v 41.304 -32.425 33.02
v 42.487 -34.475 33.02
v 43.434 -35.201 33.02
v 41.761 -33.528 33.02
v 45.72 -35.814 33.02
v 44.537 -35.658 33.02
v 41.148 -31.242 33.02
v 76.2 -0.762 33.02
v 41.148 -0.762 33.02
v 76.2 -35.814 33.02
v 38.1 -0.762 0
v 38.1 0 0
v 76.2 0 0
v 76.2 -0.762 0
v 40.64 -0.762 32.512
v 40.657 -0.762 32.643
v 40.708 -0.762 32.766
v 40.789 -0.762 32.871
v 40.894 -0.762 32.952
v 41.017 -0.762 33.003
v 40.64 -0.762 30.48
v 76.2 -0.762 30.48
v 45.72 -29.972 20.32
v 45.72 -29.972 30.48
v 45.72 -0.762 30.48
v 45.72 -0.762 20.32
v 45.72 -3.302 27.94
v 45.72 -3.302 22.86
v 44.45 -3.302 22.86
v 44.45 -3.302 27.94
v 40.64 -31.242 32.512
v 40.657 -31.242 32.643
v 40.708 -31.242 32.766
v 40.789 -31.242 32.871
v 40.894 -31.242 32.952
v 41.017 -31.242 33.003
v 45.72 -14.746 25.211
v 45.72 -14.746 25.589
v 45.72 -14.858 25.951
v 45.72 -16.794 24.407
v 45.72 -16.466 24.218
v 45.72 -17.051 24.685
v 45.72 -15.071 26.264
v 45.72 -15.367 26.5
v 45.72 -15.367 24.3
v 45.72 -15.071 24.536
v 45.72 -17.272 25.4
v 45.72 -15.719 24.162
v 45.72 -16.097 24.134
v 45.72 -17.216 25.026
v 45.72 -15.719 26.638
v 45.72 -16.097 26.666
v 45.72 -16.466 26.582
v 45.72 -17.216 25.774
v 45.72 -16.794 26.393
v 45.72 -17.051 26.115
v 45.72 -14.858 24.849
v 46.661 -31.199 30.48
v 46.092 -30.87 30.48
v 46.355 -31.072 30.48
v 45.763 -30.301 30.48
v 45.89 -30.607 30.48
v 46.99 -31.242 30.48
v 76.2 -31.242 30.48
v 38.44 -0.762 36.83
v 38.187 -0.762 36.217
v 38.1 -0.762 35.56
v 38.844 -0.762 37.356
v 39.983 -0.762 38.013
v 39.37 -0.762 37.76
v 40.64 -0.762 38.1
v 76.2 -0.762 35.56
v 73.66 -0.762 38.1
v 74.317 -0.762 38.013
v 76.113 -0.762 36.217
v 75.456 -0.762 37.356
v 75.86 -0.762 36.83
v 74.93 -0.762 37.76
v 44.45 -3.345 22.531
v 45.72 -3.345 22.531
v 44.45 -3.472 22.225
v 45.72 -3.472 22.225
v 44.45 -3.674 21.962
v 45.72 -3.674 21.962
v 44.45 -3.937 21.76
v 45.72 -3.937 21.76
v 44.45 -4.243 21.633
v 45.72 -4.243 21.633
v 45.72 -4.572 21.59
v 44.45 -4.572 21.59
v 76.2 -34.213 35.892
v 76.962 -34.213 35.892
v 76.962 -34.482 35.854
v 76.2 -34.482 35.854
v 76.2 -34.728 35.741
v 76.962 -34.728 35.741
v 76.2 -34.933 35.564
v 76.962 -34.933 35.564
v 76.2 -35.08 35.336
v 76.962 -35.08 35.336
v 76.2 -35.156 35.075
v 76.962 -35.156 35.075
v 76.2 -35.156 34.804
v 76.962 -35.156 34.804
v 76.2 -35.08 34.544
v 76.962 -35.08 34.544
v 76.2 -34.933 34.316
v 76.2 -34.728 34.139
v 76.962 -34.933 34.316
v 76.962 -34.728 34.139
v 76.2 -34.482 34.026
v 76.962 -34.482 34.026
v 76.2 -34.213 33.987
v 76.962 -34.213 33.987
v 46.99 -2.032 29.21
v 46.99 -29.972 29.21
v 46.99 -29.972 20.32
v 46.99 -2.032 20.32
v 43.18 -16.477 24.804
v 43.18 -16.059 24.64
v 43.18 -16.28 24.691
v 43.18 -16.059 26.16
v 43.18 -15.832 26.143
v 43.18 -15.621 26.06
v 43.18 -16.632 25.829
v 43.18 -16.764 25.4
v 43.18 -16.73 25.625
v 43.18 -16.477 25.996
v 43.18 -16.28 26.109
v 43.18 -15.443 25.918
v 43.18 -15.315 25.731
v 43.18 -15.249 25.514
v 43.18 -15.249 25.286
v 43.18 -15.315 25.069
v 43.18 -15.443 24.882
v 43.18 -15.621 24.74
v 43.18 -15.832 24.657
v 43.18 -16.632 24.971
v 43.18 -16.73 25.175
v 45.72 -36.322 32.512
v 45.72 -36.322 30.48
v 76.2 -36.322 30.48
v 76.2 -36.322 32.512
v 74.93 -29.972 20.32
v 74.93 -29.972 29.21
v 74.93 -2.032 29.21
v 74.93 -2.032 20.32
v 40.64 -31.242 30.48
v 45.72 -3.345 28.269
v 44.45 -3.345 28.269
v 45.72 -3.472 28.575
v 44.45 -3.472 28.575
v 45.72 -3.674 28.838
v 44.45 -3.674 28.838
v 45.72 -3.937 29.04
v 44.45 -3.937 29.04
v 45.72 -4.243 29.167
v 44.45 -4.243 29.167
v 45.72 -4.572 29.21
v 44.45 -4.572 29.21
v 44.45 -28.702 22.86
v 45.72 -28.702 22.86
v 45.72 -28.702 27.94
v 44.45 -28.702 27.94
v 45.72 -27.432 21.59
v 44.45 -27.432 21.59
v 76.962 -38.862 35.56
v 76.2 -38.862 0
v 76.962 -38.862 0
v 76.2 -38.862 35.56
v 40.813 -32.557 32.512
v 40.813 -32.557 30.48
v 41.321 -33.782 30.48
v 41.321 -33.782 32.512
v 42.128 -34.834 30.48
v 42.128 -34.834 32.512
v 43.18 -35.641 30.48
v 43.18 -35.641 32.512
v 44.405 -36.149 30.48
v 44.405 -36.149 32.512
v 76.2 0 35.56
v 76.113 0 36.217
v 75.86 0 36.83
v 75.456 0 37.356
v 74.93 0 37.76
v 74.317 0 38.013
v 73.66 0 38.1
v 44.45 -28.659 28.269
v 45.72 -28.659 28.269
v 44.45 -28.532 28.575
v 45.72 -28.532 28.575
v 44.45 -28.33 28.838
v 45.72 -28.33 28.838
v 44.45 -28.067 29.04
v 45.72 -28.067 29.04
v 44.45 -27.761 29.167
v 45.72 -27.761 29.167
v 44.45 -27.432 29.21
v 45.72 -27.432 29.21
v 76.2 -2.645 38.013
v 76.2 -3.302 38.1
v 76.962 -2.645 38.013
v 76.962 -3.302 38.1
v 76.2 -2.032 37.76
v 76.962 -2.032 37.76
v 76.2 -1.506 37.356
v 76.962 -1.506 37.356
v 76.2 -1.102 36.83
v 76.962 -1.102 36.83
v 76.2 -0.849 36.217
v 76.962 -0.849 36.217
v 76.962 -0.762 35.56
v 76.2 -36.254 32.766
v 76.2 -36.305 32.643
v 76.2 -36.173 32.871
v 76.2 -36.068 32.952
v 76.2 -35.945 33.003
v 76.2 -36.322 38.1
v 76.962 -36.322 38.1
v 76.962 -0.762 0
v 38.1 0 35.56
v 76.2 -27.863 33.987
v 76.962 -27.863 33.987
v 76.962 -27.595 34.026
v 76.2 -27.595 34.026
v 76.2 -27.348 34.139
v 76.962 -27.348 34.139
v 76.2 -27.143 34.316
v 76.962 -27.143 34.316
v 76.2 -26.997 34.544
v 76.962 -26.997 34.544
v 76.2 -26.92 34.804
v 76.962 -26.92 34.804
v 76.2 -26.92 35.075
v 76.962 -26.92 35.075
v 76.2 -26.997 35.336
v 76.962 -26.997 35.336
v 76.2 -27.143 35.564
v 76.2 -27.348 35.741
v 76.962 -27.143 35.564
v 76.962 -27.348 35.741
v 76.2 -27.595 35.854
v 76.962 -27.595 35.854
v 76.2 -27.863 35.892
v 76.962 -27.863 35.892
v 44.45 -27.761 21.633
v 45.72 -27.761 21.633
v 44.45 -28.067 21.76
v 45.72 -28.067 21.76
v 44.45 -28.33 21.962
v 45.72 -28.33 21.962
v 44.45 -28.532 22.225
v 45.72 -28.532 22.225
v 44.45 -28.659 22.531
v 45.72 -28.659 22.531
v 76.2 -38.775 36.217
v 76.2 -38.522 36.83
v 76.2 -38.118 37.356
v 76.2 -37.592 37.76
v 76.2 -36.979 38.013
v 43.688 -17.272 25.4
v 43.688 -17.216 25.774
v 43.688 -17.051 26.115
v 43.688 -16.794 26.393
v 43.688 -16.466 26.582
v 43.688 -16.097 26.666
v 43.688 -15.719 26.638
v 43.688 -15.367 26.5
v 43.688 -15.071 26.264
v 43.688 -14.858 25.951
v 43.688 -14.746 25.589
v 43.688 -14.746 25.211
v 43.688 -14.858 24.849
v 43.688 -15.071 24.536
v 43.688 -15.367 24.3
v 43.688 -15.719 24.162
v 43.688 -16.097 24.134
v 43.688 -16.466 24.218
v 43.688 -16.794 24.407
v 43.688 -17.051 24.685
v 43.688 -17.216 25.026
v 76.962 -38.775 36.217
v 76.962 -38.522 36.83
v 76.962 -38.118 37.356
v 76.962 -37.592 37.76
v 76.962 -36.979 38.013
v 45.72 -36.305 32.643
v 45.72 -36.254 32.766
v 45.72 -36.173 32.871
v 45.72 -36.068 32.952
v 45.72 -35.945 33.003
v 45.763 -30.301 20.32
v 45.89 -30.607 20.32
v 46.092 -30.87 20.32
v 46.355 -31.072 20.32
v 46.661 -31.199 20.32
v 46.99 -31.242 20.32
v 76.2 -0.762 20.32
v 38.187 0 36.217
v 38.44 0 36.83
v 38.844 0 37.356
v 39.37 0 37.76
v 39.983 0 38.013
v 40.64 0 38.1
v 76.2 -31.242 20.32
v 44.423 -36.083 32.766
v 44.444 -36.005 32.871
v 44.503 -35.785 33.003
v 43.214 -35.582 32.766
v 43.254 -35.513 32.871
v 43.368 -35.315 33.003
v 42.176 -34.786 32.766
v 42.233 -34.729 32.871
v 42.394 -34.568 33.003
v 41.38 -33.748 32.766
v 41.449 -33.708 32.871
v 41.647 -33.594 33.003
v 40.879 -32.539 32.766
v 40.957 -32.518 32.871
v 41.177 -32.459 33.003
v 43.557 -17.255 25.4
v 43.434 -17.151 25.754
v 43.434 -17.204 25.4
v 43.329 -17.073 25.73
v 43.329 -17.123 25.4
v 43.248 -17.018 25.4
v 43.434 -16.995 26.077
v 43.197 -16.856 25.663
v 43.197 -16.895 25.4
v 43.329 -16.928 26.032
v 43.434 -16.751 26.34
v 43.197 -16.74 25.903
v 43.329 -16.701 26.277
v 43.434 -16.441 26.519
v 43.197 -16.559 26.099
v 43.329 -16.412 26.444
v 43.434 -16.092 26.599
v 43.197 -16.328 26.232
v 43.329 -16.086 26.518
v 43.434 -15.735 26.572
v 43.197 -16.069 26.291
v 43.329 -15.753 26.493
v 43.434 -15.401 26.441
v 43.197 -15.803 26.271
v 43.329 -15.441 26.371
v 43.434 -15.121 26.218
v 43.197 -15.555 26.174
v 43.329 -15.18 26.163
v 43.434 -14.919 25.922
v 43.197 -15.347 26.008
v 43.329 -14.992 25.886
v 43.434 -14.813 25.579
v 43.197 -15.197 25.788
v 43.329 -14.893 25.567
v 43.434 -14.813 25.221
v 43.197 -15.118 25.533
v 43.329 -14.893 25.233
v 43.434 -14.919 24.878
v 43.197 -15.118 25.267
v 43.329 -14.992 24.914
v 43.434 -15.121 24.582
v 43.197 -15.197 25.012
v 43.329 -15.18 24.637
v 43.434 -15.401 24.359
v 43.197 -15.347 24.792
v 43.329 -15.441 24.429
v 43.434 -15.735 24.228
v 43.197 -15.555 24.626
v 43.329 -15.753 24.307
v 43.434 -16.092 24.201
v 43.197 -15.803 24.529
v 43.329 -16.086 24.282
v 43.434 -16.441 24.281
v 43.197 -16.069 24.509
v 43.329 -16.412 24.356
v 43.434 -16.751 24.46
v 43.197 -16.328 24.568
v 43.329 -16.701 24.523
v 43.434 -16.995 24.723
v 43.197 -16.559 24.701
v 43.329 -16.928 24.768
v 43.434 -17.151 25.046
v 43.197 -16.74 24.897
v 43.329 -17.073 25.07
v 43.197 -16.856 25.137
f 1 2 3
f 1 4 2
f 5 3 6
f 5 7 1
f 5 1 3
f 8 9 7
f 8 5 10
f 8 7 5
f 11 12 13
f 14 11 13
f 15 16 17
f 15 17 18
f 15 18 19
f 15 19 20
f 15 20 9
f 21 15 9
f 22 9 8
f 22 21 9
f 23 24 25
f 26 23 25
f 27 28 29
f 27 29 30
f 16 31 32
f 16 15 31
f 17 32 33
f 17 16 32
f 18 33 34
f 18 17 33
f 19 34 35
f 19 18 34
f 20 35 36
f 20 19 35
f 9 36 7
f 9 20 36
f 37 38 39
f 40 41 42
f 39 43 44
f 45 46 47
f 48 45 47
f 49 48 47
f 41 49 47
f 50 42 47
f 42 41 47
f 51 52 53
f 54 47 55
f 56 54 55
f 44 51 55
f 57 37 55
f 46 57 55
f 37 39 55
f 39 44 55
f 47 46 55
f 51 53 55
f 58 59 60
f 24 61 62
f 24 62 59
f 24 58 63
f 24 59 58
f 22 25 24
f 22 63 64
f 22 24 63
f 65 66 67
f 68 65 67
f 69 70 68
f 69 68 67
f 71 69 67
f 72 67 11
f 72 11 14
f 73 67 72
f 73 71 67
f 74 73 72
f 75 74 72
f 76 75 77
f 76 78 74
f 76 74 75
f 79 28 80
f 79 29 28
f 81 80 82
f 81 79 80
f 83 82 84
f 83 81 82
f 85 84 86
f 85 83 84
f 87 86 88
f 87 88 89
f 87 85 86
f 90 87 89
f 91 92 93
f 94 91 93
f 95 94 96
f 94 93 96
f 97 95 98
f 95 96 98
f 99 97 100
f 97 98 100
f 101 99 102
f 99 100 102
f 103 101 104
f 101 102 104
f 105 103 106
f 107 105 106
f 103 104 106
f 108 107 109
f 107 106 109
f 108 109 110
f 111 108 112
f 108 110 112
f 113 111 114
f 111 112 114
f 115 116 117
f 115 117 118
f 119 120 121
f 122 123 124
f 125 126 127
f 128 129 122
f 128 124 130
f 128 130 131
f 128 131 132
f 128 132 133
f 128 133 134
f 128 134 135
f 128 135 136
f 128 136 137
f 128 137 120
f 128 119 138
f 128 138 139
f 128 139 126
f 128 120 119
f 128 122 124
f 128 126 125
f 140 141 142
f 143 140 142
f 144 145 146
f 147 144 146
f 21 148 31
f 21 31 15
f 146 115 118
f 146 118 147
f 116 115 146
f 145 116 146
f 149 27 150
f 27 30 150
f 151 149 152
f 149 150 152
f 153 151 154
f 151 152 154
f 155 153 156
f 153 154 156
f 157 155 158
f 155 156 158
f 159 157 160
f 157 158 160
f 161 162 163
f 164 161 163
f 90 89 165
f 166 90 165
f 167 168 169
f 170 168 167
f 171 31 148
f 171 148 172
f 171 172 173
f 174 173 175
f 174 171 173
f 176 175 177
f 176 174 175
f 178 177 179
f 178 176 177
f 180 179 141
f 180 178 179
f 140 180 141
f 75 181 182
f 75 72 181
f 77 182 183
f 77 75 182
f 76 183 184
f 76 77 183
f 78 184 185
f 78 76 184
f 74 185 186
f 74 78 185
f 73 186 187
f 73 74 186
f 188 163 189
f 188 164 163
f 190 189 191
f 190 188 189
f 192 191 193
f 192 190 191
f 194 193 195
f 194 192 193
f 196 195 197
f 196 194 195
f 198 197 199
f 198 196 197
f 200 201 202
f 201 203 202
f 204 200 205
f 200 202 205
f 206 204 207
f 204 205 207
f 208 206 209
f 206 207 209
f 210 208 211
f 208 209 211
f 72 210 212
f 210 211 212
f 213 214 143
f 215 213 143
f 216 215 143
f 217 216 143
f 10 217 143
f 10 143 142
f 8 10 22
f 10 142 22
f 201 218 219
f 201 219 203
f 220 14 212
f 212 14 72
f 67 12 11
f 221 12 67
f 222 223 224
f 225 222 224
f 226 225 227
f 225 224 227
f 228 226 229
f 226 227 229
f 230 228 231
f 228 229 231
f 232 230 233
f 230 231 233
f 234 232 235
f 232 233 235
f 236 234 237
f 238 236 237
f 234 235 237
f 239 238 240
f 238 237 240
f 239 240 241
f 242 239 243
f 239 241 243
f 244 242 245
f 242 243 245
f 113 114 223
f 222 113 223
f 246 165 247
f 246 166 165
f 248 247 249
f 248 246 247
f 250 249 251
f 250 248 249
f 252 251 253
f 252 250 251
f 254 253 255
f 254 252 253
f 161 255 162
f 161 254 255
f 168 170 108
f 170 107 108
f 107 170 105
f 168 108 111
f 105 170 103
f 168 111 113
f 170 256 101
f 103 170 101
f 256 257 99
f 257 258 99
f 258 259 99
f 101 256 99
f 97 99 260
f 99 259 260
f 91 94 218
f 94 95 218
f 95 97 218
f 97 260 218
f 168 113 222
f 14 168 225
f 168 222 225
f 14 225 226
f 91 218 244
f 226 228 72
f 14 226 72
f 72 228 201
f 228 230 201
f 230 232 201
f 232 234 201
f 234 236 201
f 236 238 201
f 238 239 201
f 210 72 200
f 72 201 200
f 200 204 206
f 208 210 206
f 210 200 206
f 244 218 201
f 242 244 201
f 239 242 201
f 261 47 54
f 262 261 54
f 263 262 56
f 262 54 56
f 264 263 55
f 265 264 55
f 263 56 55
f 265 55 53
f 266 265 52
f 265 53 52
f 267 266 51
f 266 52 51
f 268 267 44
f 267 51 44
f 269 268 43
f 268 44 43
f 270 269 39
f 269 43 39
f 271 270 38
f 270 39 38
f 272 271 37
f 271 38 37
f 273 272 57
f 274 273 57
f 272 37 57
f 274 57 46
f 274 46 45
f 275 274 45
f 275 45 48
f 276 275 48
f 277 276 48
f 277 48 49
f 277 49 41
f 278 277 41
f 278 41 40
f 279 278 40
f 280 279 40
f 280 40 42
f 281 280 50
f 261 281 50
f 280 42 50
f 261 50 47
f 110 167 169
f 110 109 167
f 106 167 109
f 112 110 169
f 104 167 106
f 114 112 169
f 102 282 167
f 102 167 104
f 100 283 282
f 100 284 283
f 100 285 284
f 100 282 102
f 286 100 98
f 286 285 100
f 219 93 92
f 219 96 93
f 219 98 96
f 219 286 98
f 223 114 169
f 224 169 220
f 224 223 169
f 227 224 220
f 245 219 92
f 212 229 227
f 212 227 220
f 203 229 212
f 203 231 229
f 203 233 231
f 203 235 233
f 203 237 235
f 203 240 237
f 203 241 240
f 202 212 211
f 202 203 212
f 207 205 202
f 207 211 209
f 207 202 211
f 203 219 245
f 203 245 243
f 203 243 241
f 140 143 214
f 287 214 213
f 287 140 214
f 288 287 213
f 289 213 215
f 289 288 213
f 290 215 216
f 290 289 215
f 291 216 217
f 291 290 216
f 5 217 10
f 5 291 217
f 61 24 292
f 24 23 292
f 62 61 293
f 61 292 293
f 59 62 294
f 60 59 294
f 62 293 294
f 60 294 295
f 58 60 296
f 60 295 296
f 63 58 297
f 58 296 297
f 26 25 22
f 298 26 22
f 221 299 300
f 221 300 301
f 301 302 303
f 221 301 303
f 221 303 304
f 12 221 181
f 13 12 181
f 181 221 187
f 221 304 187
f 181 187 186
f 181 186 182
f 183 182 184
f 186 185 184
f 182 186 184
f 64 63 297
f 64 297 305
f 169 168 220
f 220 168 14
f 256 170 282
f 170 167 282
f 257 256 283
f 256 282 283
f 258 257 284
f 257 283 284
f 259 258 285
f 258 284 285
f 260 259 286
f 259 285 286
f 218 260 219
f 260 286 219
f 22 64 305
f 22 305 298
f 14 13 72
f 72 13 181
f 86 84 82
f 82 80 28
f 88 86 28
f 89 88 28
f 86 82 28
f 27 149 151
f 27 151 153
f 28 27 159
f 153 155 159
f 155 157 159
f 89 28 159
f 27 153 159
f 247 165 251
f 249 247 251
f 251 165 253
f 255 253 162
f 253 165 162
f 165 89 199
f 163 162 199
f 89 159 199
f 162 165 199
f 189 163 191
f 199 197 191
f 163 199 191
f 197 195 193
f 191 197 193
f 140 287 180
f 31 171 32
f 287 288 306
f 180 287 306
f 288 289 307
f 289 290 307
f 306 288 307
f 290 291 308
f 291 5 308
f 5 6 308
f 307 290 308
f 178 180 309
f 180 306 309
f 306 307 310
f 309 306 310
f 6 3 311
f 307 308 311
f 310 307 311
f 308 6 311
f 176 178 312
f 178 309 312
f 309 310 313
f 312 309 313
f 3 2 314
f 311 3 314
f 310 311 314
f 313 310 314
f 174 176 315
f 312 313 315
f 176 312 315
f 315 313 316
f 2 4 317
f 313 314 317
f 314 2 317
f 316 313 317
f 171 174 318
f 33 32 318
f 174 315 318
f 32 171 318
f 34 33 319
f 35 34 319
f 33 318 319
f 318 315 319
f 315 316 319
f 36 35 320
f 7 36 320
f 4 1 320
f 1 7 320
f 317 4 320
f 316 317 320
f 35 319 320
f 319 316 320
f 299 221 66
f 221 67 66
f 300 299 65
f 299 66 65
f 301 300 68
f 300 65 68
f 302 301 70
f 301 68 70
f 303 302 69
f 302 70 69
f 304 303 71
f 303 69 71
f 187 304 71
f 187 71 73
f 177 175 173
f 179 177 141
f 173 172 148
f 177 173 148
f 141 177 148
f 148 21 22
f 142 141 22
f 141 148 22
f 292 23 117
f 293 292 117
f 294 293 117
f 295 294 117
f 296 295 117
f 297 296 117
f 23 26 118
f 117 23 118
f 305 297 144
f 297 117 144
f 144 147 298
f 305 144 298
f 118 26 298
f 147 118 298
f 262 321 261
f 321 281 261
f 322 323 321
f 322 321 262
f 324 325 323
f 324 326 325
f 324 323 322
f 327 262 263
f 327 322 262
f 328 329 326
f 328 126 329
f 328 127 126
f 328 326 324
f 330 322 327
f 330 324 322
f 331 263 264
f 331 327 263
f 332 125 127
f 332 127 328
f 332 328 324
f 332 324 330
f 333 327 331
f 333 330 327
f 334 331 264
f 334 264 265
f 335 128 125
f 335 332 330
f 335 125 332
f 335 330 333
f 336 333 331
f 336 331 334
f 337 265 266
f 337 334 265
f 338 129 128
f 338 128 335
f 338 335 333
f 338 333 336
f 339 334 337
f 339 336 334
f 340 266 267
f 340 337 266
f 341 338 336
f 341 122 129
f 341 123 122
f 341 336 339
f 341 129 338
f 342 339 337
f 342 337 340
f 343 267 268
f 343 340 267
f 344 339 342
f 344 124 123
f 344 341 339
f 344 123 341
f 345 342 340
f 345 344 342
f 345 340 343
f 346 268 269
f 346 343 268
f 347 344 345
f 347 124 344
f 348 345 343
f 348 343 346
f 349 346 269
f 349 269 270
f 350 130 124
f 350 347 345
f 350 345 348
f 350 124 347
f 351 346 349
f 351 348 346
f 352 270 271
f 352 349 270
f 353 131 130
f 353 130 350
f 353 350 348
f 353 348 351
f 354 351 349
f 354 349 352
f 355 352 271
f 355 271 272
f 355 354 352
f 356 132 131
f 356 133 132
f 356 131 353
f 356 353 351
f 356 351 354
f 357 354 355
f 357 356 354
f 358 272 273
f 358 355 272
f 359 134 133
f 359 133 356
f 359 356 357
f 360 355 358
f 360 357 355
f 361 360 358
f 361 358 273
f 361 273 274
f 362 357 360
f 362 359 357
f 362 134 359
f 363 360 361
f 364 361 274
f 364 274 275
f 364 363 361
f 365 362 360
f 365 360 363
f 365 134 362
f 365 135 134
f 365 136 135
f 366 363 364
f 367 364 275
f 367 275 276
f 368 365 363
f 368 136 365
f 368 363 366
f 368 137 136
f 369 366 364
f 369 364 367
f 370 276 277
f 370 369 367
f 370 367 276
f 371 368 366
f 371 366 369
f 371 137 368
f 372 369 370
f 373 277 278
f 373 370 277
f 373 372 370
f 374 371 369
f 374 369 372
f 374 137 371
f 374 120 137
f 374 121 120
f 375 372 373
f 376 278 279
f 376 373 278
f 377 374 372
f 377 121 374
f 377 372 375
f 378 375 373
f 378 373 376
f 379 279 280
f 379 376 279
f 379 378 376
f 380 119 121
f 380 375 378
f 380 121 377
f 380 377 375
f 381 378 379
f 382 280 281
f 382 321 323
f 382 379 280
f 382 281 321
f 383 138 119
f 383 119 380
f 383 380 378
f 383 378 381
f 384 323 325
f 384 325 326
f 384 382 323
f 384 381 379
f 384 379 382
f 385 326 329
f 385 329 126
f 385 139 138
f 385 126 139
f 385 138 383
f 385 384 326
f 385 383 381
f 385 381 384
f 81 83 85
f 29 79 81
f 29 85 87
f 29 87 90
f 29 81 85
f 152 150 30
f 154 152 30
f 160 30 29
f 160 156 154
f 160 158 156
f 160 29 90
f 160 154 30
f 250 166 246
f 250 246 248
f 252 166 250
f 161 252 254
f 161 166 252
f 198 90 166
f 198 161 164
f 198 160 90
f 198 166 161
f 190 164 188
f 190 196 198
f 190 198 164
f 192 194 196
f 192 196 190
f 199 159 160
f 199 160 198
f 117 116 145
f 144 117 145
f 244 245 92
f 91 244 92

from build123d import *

# Parameters (mm, degrees)
F0_W      = 38.1
F0_H      = 38.1
F2_DEPTH  = 0.762
F1_W      = 38.1
F1_H      = 38.1
F3_DEPTH  = 0.762
F4_W      = 35.56
F4_H      = 35.56
F5_DEPTH  = 17.78
F8_W      = 30.48
F8_H      = 30.48
F9_DEPTH  = 10.16
F7_W      = 35.56
F7_H      = 35.56
F10_DEPTH = 2.54
F11_W     = 30.48
F11_H     = 12.7
F12_DEPTH = 1.27
F13_R     = 1.27
F14_DEPTH = 1.27
F16_R     = 1.27
F17_DEPTH = 2.54
F15_W     = 25.4
F15_H     = 7.62
F18_DEPTH = 1.27
F19_R     = 2.54
F19_2_R   = 2.54
F20_R     = 5.08
F21_R     = 1.27
F21_2_R   = 1.27
F23_DEPTH = 12.7
F24_DEPTH = 0.762
F26_W     = 38.1
F26_H     = 38.1
F27_DEPTH = 0.762
F29_DEPTH = 12.7
F30_R     = 2.54
F30_2_R   = 2.54
F31_T     = 1.27
F33_DEPTH = 25.4
F34_R     = 0.508
F35_R     = 0.508
F36_R     = 0.508
F37_R     = 2.54
F38_R     = 1.27


# Not quite as in the source:
# - a shell that OpenCascade refuses in one call is made with other operations: the cavity is built on its own and cut out
# - a feature names something its author has since deleted; it is built from what else it names


with BuildPart() as f2:
    # F0 (on Right) → F2 (new body)
    with BuildSketch(Plane.YZ):
        with Locations((-19.05, 19.05)):
            Rectangle(F0_W, F0_H)
    extrude(amount=-F2_DEPTH)

    # F19
    f19_edges = [f2.edges().sort_by_distance(p)[0] for p in [
        (-0.381, -38.1, 38.1),
        (-0.381, 0, 38.1),
    ]]
    fillet(f19_edges, radius=F19_R)

    # F22 (on face) → F23 (cut)
    with BuildSketch(Plane.YZ):
        with BuildLine():
            ThreePointArc((35.283215344, 34.4806989491), (34.330715344, 35.4331989491), (33.378215344, 34.4806989491))
            Line((33.378215344, 34.4806989491), (33.378215344, 28.1306989491))
            ThreePointArc((33.378215344, 28.1306989491), (34.330715344, 27.1781989491), (35.283215344, 28.1306989491))
            Line((35.283215344, 28.1306989491), (35.283215344, 34.4806989491))
        make_face()
    extrude(amount=-F23_DEPTH, mode=Mode.SUBTRACT)

    # F32 (on face) → F33 (cut)
    with BuildSketch(Plane(origin=(-0.762, 0, 0), x_dir=(0, -1, 0), z_dir=(-1, 0, 0))):
        with BuildLine():
            ThreePointArc((35.2714537645, 33.5571871057), (34.3189537645, 34.5096871057), (33.3664537645, 33.5571871057))
            Line((33.3664537645, 33.5571871057), (33.3664537645, 27.2071871057))
            ThreePointArc((33.3664537645, 27.2071871057), (34.3189537645, 26.2546871057), (35.2714537645, 27.2071871057))
            Line((35.2714537645, 27.2071871057), (35.2714537645, 33.5571871057))
        make_face()
    extrude(amount=-F33_DEPTH, mode=Mode.SUBTRACT)


with BuildPart() as f3:
    # F1 (on Front) → F3 (new body)
    with BuildSketch(Plane.XZ):
        with Locations((19.05, 19.05)):
            Rectangle(F1_W, F1_H)
    extrude(amount=F3_DEPTH)

    # F19#2
    f19_2_edges = [f3.edges().sort_by_distance(p)[0] for p in [
        (0, -0.381, 38.1),
    ]]
    fillet(f19_2_edges, radius=F19_2_R)


with BuildPart() as f5:
    # F4 (on Top) → F5 (new body)
    with BuildSketch(Plane.XY):
        with Locations((17.78, -18.5785688174)):
            Rectangle(F4_W, F4_H)
    extrude(amount=F5_DEPTH)

    # F21
    f21_edges = [f5.edges().sort_by_distance(p)[0] for p in [
        (35.56, -18.578569, 17.78),
    ]]
    fillet(f21_edges, radius=F21_R)


with BuildPart() as f9:
    # F8 (on offset) → F9 (new body)
    with BuildSketch(Plane.XY.offset(30.48)):
        with Locations((60.96, -16.002)):
            Rectangle(F8_W, F8_H)
    extrude(amount=-F9_DEPTH)

    # F21#2
    f21_2_edges = [f9.edges().sort_by_distance(p)[0] for p in [
        (45.72, -31.242, 25.4),
    ]]
    fillet(f21_2_edges, radius=F21_2_R)

    # F31: shell of thickness 1.27, made by hand


with BuildPart() as f10:
    # F7 (on offset) → F10 (new body)
    with BuildSketch(Plane.XY.offset(30.48)):
        with Locations((58.42, -18.542)):
            Rectangle(F7_W, F7_H)
    extrude(amount=F10_DEPTH)

    # F20
    f20_edges = [f10.edges().sort_by_distance(p)[0] for p in [
        (40.64, -36.322, 31.75),
    ]]
    fillet(f20_edges, radius=F20_R)

    # F34
    f34_edges = [f10.edges().sort_by_distance(p)[0] for p in [
        (40.64, -16.002, 33.02),
    ]]
    fillet(f34_edges, radius=F34_R)


with BuildPart() as f12:
    # F11 (on face) → F12 (new body)
    with BuildSketch(Plane.XZ.offset(36.3585688174)):
        with Locations((18.542, 8.89)):
            Rectangle(F11_W, F11_H)
    extrude(amount=F12_DEPTH)

    # F37
    f37_edges = [f12.edges().sort_by_distance(p)[0] for p in [
        (3.302, -36.993569, 15.24),
        (3.302, -36.993569, 2.54),
        (33.782, -36.993569, 2.54),
        (33.782, -36.993569, 15.24),
    ]]
    fillet(f37_edges, radius=F37_R)


with BuildPart() as f14:
    # F13 (on face) → F14 (new body)
    with BuildSketch(Plane.XZ.offset(37.6285688174)):
        with Locations((18.542, 8.89)):
            Circle(F13_R)
    extrude(amount=F14_DEPTH)

    # F35
    f35_edges = [f14.edges().sort_by_distance(p)[0] for p in [
        (17.272, -38.898569, 8.89),
    ]]
    fillet(f35_edges, radius=F35_R)


with BuildPart() as f17:
    # F16 (on face) → F17 (new body)
    with BuildSketch(Plane(origin=(45.72, 0, 0), x_dir=(0, -1, 0), z_dir=(-1, 0, 0))):
        with Locations((16.002, 25.4)):
            Circle(F16_R)
    extrude(amount=F17_DEPTH)

    # F36
    f36_edges = [f17.edges().sort_by_distance(p)[0] for p in [
        (43.18, -14.732, 25.4),
    ]]
    fillet(f36_edges, radius=F36_R)


with BuildPart() as f18:
    # F15 (on face) → F18 (new body)
    with BuildSketch(Plane(origin=(45.72, 0, 0), x_dir=(0, -1, 0), z_dir=(-1, 0, 0))):
        with Locations((16.002, 25.4)):
            Rectangle(F15_W, F15_H)
    extrude(amount=F18_DEPTH)

    # F38
    f38_edges = [f18.edges().sort_by_distance(p)[0] for p in [
        (45.085, -28.702, 21.59),
        (45.085, -28.702, 29.21),
        (45.085, -3.302, 21.59),
        (45.085, -3.302, 29.21),
    ]]
    fillet(f38_edges, radius=F38_R)


with BuildPart() as f24:
    # F1 (on Front) → F24 (new body)
    with BuildSketch(Plane.XZ):
        with Locations((57.15, 19.05)):
            Rectangle(F1_W, F1_H)
    extrude(amount=F24_DEPTH)

    # F30
    f30_edges = [f24.edges().sort_by_distance(p)[0] for p in [
        (76.2, -0.381, 38.1),
        (38.1, -0.381, 38.1),
    ]]
    fillet(f30_edges, radius=F30_R)


with BuildPart() as f27:
    # F26 (on offset) → F27 (new body)
    with BuildSketch(Plane.YZ.offset(76.2)):
        with Locations((-19.812, 19.05)):
            Rectangle(F26_W, F26_H)
    extrude(amount=F27_DEPTH)

    # F28 (on face) → F29 (cut)
    with BuildSketch(Plane.YZ.offset(76.962)):
        with BuildLine():
            Line((-27.8631728142, 35.8923991907), (-34.2131728142, 35.8923991907))
            ThreePointArc((-34.2131728142, 35.8923991907), (-35.1656728142, 34.9398991907), (-34.2131728142, 33.9873991907))
            Line((-34.2131728142, 33.9873991907), (-27.8631728142, 33.9873991907))
            ThreePointArc((-27.8631728142, 33.9873991907), (-26.9106728142, 34.9398991907), (-27.8631728142, 35.8923991907))
        make_face()
    extrude(amount=-F29_DEPTH, mode=Mode.SUBTRACT)

    # F30#2
    f30_2_edges = [f27.edges().sort_by_distance(p)[0] for p in [
        (76.581, -0.762, 38.1),
        (76.581, -38.862, 38.1),
    ]]
    fillet(f30_2_edges, radius=F30_2_R)


with BuildPart() as f31_core1:
    # F31_t2: copy of F9
    add(f9.part)

    # the walls: a layer under each face that stays
    f31_faces = [f31_core1.faces().sort_by_distance(p)[0] for p in [
        (45.72, -15.367, 25.4),
        (60.96, -16.002, 30.48),
        (60.96, -0.762, 25.4),
        (61.595, -31.242, 25.4),
        (76.2, -16.002, 25.4),
    ]]
    thicken(f31_faces, amount=-F31_T, mode=Mode.SUBTRACT)


with BuildPart() as f9_1:
    add(f9.part)

    # what is left inside the walls is the cavity
    f31_cavity = [f31_core1.part.solids().sort_by_distance(p)[0] for p in [
        (60.96, -20.658667, 20.3327),
    ]]
    add(f31_cavity, mode=Mode.SUBTRACT)


solid = Compound([f10.part, f17.part, f18.part, f24.part, f27.part, f9_1.part])
